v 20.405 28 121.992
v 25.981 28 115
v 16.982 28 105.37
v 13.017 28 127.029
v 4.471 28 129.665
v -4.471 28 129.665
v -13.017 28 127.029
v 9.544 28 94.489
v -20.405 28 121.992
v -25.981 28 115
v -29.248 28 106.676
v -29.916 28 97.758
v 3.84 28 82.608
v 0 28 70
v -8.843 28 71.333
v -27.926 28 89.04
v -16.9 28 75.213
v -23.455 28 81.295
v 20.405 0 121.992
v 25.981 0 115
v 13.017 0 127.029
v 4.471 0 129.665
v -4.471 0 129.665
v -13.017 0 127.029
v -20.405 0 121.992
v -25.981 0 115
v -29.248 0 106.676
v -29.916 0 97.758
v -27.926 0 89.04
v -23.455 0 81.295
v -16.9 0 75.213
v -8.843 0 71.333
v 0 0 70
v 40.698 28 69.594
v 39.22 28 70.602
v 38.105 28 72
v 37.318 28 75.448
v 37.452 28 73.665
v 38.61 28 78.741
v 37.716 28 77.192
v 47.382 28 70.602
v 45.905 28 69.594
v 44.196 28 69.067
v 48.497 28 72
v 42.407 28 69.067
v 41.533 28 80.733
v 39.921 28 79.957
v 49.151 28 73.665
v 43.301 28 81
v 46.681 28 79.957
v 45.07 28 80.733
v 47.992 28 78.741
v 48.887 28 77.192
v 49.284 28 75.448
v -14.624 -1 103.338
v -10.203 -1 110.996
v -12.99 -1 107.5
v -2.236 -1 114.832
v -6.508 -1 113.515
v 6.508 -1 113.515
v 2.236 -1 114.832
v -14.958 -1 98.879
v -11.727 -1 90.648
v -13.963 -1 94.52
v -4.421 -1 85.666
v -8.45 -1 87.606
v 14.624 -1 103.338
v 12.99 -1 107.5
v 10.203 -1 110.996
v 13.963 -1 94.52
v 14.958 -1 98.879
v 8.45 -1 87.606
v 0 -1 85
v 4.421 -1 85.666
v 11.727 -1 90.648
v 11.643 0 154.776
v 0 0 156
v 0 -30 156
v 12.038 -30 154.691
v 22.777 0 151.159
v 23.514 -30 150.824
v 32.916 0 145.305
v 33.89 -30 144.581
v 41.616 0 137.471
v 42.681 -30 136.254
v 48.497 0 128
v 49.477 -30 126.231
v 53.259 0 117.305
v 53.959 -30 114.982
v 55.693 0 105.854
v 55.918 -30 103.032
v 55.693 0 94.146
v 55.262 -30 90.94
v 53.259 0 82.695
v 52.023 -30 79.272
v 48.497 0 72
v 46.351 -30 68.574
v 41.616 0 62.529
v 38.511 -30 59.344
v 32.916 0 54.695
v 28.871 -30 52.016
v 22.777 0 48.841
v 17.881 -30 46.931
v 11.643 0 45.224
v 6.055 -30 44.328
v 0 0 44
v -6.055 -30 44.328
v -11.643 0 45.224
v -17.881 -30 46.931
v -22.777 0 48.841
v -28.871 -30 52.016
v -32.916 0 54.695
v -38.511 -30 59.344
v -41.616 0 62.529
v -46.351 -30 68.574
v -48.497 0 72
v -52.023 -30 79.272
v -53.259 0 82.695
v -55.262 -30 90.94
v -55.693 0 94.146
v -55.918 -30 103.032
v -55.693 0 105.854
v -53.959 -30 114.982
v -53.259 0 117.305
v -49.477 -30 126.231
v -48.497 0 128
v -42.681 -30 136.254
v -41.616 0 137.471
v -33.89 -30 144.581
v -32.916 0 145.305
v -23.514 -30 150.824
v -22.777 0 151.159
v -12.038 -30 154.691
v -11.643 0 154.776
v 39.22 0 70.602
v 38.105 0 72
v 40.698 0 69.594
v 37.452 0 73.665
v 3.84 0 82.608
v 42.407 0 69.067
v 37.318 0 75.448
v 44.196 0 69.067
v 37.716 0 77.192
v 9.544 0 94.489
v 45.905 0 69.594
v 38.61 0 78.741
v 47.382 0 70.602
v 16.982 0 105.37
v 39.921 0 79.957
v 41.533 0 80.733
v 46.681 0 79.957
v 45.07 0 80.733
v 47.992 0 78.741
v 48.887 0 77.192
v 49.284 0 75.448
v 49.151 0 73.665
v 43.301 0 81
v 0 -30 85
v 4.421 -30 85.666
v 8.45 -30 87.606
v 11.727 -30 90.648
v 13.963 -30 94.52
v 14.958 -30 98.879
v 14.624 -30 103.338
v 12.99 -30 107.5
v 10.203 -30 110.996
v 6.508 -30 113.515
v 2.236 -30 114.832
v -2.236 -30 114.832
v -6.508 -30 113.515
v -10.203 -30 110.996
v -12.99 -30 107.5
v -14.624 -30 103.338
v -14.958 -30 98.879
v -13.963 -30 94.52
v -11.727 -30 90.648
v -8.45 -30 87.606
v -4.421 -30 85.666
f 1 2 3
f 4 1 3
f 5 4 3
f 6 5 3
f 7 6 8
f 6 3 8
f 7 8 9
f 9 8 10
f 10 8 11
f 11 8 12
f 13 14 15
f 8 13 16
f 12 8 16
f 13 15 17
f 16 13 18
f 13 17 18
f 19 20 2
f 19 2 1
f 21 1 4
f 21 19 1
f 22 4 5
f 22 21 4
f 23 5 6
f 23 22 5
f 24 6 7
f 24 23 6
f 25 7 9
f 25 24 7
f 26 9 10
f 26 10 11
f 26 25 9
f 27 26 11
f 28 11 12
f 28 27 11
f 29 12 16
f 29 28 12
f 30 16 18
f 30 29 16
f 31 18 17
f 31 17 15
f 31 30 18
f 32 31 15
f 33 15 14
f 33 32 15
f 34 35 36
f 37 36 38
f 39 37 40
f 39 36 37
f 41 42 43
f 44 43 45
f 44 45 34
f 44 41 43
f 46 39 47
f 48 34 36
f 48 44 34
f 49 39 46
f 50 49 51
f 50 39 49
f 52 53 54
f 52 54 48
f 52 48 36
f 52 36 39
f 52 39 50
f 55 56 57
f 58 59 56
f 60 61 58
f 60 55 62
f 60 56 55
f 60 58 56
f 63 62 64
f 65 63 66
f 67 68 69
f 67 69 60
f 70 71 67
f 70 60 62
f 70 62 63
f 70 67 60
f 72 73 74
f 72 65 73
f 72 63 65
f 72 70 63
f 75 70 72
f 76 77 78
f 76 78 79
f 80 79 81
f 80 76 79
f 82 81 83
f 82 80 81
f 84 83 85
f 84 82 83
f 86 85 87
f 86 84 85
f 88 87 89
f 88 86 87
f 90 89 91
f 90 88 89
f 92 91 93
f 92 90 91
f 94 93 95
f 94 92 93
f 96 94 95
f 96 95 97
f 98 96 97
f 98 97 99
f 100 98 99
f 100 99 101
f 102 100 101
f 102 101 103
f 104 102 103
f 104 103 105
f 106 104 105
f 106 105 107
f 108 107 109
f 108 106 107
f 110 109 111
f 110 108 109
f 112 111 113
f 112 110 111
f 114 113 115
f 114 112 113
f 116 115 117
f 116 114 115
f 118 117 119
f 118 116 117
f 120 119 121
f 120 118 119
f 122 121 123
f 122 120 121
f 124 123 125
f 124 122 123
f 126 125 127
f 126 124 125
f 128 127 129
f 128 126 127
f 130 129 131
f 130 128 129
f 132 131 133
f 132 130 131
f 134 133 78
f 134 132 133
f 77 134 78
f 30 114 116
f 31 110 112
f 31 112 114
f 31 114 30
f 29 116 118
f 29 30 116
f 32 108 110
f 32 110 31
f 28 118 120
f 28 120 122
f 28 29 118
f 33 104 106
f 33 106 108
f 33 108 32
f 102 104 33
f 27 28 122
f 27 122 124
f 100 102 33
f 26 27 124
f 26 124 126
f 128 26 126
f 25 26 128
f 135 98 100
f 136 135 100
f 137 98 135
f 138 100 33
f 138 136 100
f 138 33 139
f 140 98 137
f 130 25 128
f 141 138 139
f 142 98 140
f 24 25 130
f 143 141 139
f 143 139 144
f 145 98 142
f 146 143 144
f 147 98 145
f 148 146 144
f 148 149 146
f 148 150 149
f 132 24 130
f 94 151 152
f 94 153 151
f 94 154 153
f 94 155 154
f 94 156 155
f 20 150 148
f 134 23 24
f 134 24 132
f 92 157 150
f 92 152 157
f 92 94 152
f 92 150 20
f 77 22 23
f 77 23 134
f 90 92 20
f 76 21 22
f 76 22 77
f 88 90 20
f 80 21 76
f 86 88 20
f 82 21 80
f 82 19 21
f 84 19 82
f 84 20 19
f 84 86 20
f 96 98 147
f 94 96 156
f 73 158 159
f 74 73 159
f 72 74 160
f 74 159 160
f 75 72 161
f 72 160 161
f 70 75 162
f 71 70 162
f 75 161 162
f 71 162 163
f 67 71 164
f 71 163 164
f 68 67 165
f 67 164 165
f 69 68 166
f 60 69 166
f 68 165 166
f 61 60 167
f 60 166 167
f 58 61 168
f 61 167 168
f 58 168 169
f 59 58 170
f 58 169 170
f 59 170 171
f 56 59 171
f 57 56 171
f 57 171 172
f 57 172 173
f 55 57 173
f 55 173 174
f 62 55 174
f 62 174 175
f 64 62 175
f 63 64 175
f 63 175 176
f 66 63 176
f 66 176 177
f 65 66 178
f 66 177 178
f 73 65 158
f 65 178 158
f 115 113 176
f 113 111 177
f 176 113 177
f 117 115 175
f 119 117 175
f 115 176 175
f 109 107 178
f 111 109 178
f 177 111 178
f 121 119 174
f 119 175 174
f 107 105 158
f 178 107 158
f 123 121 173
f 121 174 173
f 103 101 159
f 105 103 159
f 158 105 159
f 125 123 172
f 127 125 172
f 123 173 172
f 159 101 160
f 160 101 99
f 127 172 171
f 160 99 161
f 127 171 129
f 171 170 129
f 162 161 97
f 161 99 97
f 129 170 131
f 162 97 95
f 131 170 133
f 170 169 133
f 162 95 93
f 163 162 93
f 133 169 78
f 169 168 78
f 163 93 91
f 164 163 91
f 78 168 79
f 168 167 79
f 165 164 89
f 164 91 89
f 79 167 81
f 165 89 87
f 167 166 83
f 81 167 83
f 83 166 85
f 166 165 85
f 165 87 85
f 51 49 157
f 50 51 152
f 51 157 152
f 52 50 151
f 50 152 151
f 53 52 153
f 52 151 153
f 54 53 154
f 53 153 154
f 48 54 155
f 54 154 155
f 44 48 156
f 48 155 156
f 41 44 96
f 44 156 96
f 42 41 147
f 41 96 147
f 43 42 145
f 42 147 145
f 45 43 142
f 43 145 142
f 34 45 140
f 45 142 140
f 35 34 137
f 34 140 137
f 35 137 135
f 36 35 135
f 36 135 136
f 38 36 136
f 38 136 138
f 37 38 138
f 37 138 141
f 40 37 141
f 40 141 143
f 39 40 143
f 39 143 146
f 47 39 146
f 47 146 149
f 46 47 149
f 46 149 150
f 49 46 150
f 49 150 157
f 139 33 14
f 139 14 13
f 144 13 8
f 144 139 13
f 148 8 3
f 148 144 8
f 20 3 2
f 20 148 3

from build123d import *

# Parameters (mm, degrees)
SKETCH1_R             = 6
BOSS_EXTRUDE1_DEPTH   = 28
BOSS_EXTRUDE1_2_DEPTH = 28
SKETCH2_R             = 56
BOSS_EXTRUDE3_DEPTH   = 30
SKETCH3_R             = 15
CUT_EXTRUDE1_DEPTH    = 29


with BuildPart() as part:
    # Sketch1 → Boss-Extrude1 (new body)
    with BuildSketch(Plane(origin=(0, 0, 0), x_dir=(1, 0, 0), z_dir=(0, 1, 0))):
        with Locations(Location((43.301270189, -75, 0), (0, 0, 270))):
            Circle(SKETCH1_R)
    extrude(amount=BOSS_EXTRUDE1_DEPTH)



with BuildPart() as body_2:
    # Sketch1 → Boss-Extrude1 2 (new body)
    with BuildSketch(Plane(origin=(0, 0, 0), x_dir=(1, 0, 0), z_dir=(0, 1, 0))):
        with BuildLine():
            ThreePointArc((0, -70), (9.54447402, -94.489495355), (25.980762114, -115))
            ThreePointArc((25.980762114, -115), (-25.980762114, -115), (0, -70))
        make_face()
    extrude(amount=BOSS_EXTRUDE1_2_DEPTH)


with BuildPart() as part_1:
    add(part.part)

    add(body_2.part)  # Boss-Extrude3 merges body 2
    # Sketch2 → Boss-Extrude3 (add)
    with BuildSketch(Plane(origin=(0, 0, 0), x_dir=(1, 0, 0), z_dir=(0, 1, 0))):
        with Locations(Location((0, -100, 0), (0, 0, 270))):
            Circle(SKETCH2_R)
    extrude(amount=-BOSS_EXTRUDE3_DEPTH)

    # Sketch3 → Cut-Extrude1 (cut)
    with BuildSketch(Plane.XZ.offset(30)):
        with Locations(Location((0, 100, 0), (0, 0, 270))):
            Circle(SKETCH3_R)
    extrude(amount=-CUT_EXTRUDE1_DEPTH, mode=Mode.SUBTRACT)


solid = part_1.part
